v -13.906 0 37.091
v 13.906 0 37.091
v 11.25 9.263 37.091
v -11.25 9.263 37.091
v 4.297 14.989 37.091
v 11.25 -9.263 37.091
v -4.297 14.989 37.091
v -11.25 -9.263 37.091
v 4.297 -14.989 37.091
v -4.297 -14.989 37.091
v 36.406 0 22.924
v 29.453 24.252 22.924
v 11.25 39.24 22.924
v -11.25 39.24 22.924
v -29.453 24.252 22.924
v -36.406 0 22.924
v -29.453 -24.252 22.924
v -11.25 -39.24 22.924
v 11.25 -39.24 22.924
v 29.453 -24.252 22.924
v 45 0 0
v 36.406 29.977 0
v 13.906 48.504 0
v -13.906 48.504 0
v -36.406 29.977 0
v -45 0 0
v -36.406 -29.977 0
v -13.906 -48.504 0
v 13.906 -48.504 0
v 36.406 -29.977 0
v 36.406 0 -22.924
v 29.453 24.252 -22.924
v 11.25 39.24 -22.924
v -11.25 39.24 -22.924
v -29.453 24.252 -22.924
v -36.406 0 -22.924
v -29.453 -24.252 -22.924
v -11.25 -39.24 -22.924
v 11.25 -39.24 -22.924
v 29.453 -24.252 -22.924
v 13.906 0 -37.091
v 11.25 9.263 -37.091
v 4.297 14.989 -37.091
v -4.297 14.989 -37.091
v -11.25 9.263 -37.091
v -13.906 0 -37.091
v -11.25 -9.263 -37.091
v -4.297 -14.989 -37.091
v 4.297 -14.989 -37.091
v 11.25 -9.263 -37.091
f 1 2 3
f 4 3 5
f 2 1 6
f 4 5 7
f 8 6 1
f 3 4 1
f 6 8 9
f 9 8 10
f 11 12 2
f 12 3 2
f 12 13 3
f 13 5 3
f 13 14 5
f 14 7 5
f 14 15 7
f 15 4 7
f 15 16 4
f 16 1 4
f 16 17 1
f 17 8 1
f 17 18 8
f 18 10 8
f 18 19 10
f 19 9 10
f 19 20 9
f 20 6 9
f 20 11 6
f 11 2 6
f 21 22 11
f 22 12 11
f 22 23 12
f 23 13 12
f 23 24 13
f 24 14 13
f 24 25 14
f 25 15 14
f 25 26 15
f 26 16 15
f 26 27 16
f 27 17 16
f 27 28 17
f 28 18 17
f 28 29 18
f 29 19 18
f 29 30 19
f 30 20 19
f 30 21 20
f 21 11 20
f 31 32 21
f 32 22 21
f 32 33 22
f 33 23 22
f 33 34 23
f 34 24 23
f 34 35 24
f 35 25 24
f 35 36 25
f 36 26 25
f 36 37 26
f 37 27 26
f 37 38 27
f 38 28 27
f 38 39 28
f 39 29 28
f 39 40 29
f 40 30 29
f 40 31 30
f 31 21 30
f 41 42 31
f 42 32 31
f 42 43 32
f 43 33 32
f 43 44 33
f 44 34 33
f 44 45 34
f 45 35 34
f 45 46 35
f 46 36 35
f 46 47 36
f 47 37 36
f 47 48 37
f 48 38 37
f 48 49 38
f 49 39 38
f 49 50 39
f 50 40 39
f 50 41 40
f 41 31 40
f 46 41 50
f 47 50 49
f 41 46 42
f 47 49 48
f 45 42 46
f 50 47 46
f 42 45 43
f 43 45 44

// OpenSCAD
// Generated by SolidPython 1.0.1 on 2020-07-29 00:46:52


scale(v = [15, 17, 13]) {
	sphere(r = 3);
}
/***********************************************
*********      SolidPython code:      **********
************************************************
 
# import packages: SolidPython
from solid import *
from solid.utils import *
from itertools import chain, combinations, permutations


class Resize:

    def __init__(self, scad_file):
        self.scad_file = scad_file
        #self.scad_file = import_scad(scad_file)
        # cone/cylinder param:
        self.r1 = 0
        self.r2 = 0
        self.h = 0
        # rectangular prism param:
        self.w = 0
        self.l = 0
        # ellipse param:
        self.r = 0

    # import OpenScad code (file name corresponds to shape)


    # classify shape + parameters
    def assign(self, param1, param2, param3):
        if self.scad_file == 'cone.scad':
            self.r1 = param1
            self.r2 = param2
            self.h = param3
        elif self.scad_file == 'cylinder.scad':
            self.r1 = param1
            self.r2 = param2
            self.h = param3
        elif self.scad_file == 'rectangularPrism.scad':
            self.h = param1
            self.l = param2
            self.w = param3
        else:
            self.r = param1
            self.h = param2

    # resize parameters
    def iterate(self):
        x = range(3, 20, 2)
        i = 1
        if self.scad_file == 'cone.scad':
            tempList = list(permutations(x, 2))
            for temp in tempList:
                param1 = temp[0]
                param2 = temp[1]
                filepath = 'produced_scad_files/' + 'cone' + str(param1) + '_' + str(param2) + '_' + '.scad'
                scad_render_to_file(cylinder(h=param1, r1=param2, r2=0), filepath)

        elif self.scad_file == 'cylinder.scad':
            tempList = list(permutations(x, 3))
            for temp in tempList:
                param1 = temp[0]
                param2 = temp[1]
                filepath = 'produced_scad_files/' + 'cylinder' + str(param1) + '_' + str(param2) + '_' + '.scad'
                scad_render_to_file(cylinder(h=param1, r1=param2, r2=param2), filepath)

        elif self.scad_file == 'rectangularPrism.scad':
            tempList = list(permutations(x, 3))
            for temp in tempList:
                param1 = temp[0]
                param2 = temp[1]
                param3 = temp[2]
                filepath = 'produced_scad_files/' + 'rectangularPrism' + str(param1) + '_' + str(param2) + '_' + str(
                    param3) + '.scad'
                scad_render_to_file(cube(size=(param1, param2, param3)), filepath)

        elif self.scad_file == 'ellipse.scad':
            tempList = list(permutations(x, 4))
            for temp in tempList:
                param1 = temp[0]
                param2 = temp[1]
                param3 = temp[2]
                param4 = temp[3]
                filepath = 'produced_scad_files/' + 'ellipse' + str(param1) + '_' + str(param2) + '_' + str(param3) + '_' + str(param4) + '.scad'
                scad_render_to_file(scale([param1, param2, param3])(sphere(r=param4)), filepath)

    def render_to_scadfile(self):
        scad_render_to_file(scad, 'example.scad') 
 
************************************************/
